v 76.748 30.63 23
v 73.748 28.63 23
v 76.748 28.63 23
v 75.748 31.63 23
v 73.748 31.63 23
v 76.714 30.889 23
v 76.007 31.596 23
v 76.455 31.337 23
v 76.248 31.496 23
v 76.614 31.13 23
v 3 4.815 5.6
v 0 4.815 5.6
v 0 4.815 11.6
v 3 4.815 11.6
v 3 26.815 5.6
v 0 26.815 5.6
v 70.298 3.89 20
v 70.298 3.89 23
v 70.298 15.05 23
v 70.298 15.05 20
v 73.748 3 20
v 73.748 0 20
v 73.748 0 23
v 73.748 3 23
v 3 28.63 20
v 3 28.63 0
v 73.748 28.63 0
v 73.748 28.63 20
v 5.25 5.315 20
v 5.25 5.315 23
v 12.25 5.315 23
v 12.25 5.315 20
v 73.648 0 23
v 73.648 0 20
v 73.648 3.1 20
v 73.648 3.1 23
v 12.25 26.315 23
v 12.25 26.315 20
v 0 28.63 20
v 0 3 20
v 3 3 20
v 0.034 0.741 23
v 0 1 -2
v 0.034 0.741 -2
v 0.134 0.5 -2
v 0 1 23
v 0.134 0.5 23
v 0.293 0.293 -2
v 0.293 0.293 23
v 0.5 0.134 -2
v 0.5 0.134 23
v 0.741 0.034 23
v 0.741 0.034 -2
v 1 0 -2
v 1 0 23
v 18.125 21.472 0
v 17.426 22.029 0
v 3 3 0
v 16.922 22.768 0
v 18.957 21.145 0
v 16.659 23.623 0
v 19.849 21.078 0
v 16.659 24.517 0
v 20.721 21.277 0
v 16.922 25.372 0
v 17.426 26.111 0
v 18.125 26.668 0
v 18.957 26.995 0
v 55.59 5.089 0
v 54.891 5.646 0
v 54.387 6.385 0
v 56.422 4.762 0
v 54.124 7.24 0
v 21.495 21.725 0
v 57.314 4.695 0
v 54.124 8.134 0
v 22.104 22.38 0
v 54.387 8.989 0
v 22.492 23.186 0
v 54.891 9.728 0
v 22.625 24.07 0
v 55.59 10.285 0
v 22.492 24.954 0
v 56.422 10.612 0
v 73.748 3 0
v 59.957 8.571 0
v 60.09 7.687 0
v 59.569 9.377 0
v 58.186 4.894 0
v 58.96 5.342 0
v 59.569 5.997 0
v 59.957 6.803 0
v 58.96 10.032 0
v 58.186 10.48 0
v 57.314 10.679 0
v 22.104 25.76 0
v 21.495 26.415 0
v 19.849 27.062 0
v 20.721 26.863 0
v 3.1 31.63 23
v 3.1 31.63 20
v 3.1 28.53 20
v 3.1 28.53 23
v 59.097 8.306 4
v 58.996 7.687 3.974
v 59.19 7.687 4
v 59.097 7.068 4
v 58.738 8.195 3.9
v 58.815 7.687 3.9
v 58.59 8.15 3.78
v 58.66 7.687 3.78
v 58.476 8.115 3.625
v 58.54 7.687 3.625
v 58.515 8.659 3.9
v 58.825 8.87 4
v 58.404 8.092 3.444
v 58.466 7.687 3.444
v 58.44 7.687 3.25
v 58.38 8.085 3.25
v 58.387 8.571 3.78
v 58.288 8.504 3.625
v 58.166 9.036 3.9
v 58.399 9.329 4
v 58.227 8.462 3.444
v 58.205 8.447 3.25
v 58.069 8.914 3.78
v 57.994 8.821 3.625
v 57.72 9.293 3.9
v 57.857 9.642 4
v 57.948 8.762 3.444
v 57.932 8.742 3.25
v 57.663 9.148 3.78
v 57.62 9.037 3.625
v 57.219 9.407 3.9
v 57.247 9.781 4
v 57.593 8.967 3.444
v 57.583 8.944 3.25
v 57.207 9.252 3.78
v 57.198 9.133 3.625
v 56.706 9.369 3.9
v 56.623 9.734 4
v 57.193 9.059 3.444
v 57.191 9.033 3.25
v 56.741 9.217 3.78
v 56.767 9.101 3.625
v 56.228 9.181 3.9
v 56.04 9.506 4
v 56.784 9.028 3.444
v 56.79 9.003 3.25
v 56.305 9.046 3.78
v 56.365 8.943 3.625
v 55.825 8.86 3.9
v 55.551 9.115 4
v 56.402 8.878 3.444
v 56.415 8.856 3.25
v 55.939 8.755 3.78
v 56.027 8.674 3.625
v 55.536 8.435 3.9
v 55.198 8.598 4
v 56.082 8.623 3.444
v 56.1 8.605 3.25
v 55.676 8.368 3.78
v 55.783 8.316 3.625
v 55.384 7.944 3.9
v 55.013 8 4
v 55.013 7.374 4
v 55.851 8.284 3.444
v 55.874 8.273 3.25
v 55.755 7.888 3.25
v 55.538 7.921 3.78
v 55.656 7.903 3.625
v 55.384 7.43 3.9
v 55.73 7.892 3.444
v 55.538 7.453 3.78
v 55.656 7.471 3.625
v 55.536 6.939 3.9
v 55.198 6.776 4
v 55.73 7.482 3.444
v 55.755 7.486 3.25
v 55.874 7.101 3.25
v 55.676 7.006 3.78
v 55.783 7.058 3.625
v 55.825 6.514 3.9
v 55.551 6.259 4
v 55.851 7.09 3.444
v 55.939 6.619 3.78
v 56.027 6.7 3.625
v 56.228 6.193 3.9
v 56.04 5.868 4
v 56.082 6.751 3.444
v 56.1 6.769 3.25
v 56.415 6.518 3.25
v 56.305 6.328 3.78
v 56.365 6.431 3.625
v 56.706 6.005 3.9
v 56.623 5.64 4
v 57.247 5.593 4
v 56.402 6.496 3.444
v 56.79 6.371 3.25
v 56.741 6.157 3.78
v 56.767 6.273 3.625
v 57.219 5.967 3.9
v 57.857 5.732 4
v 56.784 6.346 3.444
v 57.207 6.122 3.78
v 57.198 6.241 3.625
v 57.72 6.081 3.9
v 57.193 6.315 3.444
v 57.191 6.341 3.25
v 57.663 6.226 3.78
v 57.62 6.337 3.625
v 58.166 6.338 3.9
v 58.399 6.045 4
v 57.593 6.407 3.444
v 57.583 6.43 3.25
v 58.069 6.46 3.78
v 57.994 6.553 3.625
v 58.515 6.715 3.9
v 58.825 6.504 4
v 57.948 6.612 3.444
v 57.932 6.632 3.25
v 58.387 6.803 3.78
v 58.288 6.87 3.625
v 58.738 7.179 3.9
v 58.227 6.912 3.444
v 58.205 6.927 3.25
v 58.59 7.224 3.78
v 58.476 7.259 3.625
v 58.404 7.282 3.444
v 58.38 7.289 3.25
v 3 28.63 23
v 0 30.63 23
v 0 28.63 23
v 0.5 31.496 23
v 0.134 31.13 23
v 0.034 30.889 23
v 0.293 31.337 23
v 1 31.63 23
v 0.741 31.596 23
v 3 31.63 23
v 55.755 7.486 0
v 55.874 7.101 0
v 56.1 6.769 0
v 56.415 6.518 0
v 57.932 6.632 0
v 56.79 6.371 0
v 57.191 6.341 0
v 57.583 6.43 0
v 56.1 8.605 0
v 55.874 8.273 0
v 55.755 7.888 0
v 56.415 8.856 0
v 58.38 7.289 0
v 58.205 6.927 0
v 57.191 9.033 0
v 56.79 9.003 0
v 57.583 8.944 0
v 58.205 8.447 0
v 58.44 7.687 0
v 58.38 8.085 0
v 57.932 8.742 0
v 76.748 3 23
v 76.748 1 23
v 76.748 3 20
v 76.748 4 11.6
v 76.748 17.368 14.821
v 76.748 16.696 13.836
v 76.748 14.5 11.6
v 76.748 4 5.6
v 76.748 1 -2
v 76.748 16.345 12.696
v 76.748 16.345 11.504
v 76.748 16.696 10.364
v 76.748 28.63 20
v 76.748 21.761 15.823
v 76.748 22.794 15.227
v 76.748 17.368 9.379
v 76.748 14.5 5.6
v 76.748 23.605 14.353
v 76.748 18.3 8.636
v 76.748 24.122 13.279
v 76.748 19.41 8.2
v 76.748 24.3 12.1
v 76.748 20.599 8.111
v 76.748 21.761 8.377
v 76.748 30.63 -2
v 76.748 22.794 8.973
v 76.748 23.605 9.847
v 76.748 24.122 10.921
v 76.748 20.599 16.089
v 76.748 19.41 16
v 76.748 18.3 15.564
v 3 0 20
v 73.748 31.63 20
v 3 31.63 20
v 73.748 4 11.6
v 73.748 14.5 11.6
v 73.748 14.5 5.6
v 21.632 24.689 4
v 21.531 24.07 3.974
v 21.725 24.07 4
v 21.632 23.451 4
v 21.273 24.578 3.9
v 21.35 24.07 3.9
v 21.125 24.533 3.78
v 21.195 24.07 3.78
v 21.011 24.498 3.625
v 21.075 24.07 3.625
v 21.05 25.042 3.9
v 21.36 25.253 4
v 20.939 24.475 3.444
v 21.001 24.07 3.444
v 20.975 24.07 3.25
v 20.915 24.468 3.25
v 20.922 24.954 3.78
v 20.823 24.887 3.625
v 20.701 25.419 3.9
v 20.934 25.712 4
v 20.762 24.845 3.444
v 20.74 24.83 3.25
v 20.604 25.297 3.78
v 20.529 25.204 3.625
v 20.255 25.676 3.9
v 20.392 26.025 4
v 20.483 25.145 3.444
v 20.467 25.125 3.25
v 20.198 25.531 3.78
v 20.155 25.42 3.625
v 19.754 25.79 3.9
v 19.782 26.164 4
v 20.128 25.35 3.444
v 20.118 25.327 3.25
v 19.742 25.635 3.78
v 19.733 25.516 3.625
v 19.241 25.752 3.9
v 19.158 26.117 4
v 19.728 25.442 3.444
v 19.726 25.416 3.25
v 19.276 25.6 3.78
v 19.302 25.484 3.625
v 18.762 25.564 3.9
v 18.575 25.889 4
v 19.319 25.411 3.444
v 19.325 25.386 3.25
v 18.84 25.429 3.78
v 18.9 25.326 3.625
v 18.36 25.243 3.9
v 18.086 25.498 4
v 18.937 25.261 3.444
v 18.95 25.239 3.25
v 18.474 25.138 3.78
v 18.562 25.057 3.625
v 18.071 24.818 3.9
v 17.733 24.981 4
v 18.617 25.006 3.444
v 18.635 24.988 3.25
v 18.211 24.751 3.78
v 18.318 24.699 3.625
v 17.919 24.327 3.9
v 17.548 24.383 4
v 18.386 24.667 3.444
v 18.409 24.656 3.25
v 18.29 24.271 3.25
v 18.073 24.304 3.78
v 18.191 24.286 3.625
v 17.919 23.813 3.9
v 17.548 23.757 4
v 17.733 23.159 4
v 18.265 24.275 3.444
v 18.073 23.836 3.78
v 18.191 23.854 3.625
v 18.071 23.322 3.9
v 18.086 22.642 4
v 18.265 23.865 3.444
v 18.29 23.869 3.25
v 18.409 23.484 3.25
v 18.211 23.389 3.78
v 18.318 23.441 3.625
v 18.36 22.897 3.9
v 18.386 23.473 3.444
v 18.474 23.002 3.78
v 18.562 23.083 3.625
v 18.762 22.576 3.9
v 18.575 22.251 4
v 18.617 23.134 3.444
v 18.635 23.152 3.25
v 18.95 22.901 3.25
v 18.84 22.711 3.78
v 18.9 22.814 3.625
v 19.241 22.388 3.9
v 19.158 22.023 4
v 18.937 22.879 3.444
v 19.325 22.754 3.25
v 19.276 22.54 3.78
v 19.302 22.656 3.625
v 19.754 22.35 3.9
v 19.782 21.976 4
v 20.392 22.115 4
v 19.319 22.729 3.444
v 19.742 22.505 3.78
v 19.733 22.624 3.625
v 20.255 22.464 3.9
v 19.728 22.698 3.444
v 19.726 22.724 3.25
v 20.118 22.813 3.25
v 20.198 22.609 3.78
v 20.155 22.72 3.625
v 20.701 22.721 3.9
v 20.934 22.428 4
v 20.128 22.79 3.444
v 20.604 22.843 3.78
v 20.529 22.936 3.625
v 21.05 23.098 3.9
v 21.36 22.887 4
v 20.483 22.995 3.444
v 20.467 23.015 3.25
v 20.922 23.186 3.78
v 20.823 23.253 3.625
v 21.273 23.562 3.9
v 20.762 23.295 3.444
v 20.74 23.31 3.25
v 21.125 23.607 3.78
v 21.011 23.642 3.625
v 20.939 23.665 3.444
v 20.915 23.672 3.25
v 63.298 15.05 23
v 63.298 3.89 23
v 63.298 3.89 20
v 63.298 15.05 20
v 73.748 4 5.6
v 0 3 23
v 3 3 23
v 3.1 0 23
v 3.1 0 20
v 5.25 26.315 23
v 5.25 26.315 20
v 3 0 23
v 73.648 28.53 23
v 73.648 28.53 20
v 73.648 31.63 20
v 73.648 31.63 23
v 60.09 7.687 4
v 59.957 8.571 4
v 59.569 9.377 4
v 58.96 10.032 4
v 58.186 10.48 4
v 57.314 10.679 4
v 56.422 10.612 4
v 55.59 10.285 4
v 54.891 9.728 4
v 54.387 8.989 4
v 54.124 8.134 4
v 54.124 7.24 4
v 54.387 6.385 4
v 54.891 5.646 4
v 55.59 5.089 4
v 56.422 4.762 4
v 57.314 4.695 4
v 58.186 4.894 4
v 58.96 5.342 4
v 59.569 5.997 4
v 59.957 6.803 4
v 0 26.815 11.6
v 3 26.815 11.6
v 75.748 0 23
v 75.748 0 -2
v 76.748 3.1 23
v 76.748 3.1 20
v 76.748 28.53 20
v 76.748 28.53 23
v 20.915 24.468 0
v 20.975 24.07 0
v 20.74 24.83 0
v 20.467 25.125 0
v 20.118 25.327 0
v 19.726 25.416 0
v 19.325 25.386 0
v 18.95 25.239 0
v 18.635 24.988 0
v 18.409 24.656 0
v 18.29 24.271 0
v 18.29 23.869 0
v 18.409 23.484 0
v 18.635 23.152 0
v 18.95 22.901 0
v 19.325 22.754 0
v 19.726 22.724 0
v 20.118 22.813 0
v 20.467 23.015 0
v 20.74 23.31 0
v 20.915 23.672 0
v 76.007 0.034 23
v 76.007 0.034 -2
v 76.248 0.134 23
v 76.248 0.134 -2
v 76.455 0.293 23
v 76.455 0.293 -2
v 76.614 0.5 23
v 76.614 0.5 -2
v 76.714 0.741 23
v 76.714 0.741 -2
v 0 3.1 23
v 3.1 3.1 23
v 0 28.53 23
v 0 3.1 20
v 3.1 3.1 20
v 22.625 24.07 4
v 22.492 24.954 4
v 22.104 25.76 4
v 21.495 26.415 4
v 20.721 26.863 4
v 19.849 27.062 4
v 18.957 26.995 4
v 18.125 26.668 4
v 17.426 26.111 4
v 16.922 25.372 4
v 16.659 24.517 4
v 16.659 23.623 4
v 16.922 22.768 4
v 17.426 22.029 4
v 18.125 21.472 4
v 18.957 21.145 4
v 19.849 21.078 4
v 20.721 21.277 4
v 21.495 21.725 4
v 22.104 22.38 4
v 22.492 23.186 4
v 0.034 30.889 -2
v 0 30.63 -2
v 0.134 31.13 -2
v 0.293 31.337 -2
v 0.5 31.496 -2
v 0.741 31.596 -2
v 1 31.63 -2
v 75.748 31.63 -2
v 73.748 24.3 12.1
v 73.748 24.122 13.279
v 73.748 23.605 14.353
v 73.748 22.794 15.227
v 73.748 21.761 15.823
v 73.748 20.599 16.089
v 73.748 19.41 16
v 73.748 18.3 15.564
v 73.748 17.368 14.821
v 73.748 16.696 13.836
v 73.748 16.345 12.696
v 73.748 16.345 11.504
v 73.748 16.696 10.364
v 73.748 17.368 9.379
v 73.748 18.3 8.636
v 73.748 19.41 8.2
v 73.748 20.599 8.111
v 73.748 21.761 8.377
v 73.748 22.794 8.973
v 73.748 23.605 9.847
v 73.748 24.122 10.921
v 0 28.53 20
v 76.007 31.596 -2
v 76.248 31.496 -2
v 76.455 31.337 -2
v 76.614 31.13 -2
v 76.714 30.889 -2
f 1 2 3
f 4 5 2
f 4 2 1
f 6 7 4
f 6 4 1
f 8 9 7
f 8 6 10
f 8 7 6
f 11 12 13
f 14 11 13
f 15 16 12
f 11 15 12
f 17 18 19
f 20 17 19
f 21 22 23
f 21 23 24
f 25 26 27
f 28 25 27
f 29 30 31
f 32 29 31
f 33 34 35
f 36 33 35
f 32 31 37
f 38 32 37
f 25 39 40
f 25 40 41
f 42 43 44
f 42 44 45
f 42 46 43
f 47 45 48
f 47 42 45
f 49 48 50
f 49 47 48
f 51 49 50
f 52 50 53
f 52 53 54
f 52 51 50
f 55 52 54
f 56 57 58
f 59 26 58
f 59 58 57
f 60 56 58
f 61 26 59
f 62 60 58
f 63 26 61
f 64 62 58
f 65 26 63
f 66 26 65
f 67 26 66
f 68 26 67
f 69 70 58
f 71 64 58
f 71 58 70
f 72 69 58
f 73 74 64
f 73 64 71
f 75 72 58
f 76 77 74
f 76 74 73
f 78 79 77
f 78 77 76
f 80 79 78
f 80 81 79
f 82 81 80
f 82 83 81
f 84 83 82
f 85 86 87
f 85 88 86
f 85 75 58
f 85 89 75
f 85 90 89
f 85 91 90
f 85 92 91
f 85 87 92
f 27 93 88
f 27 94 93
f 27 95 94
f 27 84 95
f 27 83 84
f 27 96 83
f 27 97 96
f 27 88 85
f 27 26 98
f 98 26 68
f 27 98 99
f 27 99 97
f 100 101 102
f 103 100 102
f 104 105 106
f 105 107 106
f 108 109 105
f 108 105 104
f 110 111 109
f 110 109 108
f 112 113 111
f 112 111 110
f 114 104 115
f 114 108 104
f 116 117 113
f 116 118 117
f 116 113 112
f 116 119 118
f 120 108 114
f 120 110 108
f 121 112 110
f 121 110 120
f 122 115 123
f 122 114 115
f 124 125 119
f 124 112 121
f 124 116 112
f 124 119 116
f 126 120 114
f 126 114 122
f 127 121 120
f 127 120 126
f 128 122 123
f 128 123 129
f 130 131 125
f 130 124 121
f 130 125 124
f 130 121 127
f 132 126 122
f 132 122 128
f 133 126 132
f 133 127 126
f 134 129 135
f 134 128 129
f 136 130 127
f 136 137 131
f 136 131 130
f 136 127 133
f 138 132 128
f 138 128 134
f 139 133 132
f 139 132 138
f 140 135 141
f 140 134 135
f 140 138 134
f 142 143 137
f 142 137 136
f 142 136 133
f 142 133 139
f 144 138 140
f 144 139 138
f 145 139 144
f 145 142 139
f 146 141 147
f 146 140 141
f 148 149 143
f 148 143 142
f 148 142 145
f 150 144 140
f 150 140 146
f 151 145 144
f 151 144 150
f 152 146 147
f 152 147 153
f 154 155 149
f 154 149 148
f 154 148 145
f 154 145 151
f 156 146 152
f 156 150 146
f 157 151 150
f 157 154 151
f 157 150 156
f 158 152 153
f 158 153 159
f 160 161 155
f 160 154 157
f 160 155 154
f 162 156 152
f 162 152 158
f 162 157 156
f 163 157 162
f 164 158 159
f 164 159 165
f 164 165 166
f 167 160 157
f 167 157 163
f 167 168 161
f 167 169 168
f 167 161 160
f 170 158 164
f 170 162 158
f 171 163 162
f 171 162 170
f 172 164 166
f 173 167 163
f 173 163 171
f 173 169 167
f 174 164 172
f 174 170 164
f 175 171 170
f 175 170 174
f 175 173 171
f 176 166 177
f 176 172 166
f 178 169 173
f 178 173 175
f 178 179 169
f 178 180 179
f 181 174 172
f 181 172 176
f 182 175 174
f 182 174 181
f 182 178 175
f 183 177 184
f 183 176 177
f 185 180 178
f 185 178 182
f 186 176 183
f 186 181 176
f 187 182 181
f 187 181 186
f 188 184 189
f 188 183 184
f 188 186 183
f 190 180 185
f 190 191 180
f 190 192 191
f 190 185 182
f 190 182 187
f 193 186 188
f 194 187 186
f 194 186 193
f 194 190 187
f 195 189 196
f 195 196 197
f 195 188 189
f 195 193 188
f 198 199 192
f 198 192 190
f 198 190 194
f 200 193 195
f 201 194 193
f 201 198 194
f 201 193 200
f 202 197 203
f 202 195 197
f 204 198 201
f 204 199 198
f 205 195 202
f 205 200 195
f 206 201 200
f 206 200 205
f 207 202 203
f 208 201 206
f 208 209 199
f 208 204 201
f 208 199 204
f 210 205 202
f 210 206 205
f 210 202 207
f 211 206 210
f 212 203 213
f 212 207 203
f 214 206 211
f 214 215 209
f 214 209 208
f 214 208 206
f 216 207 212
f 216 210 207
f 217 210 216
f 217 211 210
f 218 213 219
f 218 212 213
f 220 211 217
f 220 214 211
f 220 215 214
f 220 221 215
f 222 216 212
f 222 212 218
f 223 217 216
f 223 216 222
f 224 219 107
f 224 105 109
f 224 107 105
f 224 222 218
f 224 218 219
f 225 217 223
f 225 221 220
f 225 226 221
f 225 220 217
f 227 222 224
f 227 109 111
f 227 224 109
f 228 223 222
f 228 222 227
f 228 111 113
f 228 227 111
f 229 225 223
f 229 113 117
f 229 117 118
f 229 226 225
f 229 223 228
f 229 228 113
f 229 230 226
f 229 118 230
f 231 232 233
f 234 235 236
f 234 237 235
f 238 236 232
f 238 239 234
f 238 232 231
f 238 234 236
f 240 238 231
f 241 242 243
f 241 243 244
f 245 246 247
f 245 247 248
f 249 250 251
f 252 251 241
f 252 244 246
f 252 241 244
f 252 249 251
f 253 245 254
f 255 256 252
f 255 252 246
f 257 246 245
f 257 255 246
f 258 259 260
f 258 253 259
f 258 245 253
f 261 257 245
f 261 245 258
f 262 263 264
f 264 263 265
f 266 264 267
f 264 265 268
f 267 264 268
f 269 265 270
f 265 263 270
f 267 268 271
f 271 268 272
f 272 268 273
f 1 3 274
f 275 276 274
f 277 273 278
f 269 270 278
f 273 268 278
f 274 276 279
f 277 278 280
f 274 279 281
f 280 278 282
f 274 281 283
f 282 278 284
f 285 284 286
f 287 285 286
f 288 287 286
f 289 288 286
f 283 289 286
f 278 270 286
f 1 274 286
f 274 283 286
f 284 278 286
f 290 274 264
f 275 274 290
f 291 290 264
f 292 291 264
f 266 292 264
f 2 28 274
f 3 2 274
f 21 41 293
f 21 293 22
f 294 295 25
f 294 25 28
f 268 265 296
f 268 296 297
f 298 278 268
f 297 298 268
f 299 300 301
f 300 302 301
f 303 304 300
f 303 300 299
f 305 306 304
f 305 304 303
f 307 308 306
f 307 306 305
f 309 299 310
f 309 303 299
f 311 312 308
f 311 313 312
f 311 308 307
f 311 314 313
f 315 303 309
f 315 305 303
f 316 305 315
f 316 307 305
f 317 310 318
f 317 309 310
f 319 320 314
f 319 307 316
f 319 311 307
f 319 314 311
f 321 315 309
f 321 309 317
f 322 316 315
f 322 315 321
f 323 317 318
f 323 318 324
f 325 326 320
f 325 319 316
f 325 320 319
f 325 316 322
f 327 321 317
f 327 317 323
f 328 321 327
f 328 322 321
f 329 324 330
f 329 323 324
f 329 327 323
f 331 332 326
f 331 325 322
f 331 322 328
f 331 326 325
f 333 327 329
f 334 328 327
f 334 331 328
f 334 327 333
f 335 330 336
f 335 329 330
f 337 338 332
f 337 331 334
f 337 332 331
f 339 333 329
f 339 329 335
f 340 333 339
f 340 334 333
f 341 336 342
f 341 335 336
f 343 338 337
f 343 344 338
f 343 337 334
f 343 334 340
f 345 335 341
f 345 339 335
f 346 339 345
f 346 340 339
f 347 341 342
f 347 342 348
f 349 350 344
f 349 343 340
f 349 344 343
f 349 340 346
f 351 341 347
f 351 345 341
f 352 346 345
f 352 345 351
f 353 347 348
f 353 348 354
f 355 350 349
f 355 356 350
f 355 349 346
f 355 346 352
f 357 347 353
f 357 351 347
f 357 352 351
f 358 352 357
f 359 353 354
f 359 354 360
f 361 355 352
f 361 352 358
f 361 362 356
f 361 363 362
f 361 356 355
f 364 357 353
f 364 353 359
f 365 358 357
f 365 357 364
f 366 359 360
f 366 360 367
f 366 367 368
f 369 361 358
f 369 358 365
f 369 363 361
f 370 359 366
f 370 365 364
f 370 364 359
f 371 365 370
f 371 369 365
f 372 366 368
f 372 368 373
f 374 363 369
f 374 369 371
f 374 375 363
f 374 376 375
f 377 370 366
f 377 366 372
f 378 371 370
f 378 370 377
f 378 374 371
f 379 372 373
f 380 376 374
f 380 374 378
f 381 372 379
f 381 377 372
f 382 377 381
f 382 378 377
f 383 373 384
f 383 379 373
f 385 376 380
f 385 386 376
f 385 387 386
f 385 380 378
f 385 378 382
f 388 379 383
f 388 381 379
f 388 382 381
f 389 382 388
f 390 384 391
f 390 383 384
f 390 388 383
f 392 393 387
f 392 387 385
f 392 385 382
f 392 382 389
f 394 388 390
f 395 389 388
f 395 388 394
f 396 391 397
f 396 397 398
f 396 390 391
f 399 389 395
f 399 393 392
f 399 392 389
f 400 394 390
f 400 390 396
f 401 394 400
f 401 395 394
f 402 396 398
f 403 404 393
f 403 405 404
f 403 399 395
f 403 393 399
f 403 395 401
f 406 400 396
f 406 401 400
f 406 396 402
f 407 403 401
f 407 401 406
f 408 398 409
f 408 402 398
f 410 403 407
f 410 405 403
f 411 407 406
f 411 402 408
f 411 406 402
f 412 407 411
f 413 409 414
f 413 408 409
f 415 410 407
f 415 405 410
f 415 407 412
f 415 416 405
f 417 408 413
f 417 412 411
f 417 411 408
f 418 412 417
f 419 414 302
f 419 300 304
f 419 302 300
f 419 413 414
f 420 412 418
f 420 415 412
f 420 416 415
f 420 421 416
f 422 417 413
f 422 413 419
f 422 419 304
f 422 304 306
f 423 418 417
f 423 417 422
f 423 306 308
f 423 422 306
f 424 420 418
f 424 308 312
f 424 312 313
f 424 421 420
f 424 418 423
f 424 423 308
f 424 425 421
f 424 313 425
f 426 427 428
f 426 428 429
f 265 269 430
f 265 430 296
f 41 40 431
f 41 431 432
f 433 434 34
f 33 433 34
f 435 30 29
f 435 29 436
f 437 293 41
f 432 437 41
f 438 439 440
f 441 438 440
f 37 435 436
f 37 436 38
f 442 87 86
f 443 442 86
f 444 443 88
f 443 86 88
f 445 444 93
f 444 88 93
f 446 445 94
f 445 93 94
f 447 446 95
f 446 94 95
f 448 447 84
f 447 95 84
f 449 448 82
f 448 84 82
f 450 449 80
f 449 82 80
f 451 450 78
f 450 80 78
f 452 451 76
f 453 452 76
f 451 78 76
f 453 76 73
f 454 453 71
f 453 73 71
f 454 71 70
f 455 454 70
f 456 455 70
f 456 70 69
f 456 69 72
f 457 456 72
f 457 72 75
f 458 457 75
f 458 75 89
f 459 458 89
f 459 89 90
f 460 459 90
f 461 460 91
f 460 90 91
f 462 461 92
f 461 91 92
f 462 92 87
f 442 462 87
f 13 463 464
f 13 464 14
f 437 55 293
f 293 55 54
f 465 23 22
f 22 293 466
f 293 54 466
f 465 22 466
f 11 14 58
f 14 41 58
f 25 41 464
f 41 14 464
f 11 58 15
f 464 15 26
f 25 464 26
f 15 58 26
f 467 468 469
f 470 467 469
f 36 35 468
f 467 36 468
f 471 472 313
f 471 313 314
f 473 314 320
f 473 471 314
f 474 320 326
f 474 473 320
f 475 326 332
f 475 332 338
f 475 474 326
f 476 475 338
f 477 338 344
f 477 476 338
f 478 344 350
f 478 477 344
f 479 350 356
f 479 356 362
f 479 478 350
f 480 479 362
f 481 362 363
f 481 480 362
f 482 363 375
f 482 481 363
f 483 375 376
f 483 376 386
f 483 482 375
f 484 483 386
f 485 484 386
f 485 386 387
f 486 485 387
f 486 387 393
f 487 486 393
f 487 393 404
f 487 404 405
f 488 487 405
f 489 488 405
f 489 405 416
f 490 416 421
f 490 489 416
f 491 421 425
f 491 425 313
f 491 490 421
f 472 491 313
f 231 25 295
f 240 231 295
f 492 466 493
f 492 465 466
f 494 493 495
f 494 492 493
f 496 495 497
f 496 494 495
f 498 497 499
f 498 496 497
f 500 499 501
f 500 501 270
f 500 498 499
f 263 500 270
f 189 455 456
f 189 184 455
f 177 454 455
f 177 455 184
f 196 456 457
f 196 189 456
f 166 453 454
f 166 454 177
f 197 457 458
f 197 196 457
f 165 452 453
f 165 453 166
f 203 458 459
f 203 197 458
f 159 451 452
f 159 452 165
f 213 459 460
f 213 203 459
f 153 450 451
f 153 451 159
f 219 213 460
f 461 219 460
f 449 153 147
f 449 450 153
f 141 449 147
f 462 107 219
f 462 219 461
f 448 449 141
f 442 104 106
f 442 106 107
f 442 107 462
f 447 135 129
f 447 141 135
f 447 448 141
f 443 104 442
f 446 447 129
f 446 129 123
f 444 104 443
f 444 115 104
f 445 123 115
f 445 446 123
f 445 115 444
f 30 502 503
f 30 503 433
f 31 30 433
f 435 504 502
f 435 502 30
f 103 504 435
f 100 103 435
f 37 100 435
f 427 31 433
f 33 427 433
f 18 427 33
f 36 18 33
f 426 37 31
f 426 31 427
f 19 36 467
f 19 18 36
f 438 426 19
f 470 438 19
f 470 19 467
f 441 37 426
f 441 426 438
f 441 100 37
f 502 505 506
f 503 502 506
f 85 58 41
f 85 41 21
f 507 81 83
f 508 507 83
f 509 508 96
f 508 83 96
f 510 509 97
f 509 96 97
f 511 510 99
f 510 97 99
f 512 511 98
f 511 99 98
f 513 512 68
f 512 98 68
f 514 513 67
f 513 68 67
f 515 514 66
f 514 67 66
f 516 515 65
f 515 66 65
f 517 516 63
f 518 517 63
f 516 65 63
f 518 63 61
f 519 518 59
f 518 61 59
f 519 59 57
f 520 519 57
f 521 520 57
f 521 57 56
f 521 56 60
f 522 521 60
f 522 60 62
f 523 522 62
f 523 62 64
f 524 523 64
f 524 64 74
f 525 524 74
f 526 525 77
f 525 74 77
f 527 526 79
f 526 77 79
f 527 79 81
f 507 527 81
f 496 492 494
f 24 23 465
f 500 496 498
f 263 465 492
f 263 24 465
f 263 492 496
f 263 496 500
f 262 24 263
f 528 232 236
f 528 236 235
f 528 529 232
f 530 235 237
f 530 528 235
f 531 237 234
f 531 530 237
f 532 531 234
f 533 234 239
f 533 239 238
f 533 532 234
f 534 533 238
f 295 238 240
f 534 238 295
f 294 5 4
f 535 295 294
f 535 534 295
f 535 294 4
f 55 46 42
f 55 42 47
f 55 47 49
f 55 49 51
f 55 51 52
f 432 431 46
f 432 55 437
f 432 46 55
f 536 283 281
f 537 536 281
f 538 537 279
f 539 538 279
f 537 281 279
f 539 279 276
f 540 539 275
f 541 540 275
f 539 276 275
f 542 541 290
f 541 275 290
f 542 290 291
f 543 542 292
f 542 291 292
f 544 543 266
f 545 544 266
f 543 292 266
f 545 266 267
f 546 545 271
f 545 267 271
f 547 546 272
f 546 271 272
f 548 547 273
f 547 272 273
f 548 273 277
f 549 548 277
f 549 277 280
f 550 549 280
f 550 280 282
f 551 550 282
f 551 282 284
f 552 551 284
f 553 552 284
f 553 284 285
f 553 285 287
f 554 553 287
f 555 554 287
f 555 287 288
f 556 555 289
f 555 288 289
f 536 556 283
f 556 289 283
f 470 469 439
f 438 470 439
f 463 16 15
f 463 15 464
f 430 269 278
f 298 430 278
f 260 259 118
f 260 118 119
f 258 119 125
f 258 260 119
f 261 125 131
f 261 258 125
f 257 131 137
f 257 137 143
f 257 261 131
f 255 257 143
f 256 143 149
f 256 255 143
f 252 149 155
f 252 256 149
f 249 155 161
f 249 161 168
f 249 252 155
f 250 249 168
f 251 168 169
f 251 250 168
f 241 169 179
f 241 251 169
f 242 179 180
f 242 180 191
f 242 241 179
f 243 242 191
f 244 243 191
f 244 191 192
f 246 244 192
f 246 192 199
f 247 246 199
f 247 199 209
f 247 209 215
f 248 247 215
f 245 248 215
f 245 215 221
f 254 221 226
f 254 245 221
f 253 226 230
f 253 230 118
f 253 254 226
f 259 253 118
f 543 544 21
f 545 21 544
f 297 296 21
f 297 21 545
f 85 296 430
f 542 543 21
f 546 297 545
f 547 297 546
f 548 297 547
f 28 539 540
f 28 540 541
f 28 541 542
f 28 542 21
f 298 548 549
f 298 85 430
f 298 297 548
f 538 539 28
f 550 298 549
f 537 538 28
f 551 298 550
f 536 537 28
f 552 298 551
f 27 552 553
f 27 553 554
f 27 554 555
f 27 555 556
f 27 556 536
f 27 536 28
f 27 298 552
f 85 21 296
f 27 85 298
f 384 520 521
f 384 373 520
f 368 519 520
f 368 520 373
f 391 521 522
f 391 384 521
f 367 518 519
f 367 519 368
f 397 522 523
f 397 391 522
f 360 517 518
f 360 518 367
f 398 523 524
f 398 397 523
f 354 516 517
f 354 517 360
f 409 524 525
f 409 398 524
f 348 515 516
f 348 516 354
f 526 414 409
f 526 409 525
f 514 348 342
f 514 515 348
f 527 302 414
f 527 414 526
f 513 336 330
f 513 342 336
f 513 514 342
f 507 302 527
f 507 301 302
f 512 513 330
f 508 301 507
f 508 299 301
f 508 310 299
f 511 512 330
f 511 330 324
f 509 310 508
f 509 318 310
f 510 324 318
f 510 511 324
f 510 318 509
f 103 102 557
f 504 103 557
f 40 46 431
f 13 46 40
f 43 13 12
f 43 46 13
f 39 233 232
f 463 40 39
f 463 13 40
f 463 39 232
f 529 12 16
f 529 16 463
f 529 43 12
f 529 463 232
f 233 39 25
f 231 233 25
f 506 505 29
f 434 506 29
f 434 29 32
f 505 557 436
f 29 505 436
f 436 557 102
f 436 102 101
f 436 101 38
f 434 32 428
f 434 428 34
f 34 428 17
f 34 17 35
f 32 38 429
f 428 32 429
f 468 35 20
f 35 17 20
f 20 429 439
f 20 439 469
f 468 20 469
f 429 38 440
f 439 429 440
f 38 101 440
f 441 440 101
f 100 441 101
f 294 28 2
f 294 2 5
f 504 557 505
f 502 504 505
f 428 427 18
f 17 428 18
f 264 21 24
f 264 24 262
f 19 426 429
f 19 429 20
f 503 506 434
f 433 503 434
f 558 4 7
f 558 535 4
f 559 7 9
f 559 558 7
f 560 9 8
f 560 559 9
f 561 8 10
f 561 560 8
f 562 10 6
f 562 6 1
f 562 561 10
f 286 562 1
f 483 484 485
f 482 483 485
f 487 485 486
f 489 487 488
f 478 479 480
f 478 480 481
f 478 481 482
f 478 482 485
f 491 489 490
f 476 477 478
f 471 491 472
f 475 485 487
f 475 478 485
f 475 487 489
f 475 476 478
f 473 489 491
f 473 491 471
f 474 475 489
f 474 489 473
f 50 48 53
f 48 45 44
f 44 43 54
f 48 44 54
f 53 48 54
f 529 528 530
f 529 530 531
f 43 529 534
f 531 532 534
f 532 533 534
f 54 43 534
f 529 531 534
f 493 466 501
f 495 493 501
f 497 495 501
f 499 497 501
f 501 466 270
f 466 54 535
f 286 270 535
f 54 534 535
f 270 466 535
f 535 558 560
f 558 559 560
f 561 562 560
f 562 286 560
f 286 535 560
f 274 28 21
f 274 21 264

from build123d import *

# Parameters (mm, degrees)
SKETCH_W        = 76.748
SKETCH_H        = 31.63
PAD_DEPTH       = 2
SKETCH001_R     = 3
SKETCH001_R_2   = 1.35
PAD001_DEPTH    = 4
SKETCH002_W     = 76.748
SKETCH002_H     = 31.63
SKETCH002_W_2   = 70.748
SKETCH002_H_2   = 25.63
PAD002_DEPTH    = 20
SKETCH003_W     = 3
SKETCH003_H     = 3
PAD003_DEPTH    = 3
SKETCH004_W     = 22
SKETCH004_H     = 6
POCKET_DEPTH    = 3
SKETCH005_R     = 4
SKETCH005_W     = 10.5
SKETCH005_H     = 6
POCKET001_DEPTH = 3
FILLET_R        = 1
FILLET001_R     = 0.75
PAD004_DEPTH    = 3
SKETCH007_W     = 7
SKETCH007_H     = 21
SKETCH007_H_2   = 11.16
POCKET002_DEPTH = 3.001


with BuildPart() as body:
    # Sketch → Pad (new body)
    with BuildSketch(Plane.XY):
        with Locations((38.374, 15.815)):
            Rectangle(SKETCH_W, SKETCH_H)
    extrude(amount=-PAD_DEPTH)

    # Sketch001 (on Face5 of Pad) → Pad001 (join)
    with BuildSketch(Plane.XY):
        with Locations((19.625, 24.07)):
            Circle(SKETCH001_R)
        with Locations((19.625, 24.07)):
            Circle(SKETCH001_R_2, mode=Mode.SUBTRACT)
        with Locations((57.09, 7.687)):
            Circle(SKETCH001_R)
        with Locations((57.09, 7.687)):
            Circle(SKETCH001_R_2, mode=Mode.SUBTRACT)
    extrude(amount=PAD001_DEPTH)

    # Sketch002 (on Face4 of Pad001) → Pad002 (join)
    with BuildSketch(Plane.XY):
        with Locations((38.374, 15.815)):
            Rectangle(SKETCH002_W, SKETCH002_H)
        with Locations((38.374, 15.815)):
            Rectangle(SKETCH002_W_2, SKETCH002_H_2, mode=Mode.SUBTRACT)
    extrude(amount=PAD002_DEPTH)

    # Sketch003 (on Face9 of Pad002) → Pad003 (join)
    with BuildSketch(Plane.XY.offset(20)):
        with Locations((1.5, 30.13)):
            Rectangle(SKETCH003_W, SKETCH003_H)
        with Locations((75.248, 30.13)):
            Rectangle(SKETCH003_W, SKETCH003_H)
        with Locations((75.248, 1.5)):
            Rectangle(SKETCH003_W, SKETCH003_H)
        with Locations((1.5, 1.5)):
            Rectangle(SKETCH003_W, SKETCH003_H)
    extrude(amount=PAD003_DEPTH)

    # Sketch004 (on Face7 of Pad003) → Pocket (cut)
    with BuildSketch(Plane(origin=(0, 0, 0), x_dir=(0, -1, 0), z_dir=(-1, 0, 0))):
        with Locations((-15.815, 8.6)):
            Rectangle(SKETCH004_W, SKETCH004_H)
    extrude(amount=-POCKET_DEPTH, mode=Mode.SUBTRACT)

    # Sketch005 (on Face8 of Pocket) → Pocket001 (cut)
    with BuildSketch(Plane.YZ.offset(76.748)):
        with Locations((20.3, 12.1)):
            Circle(SKETCH005_R)
        with Locations((9.25, 8.6)):
            Rectangle(SKETCH005_W, SKETCH005_H)
    extrude(amount=-POCKET001_DEPTH, mode=Mode.SUBTRACT)

    # Fillet
    fillet_edges = [body.edges().sort_by_distance(p)[0] for p in [
        (76.748, 31.63, 10),
        (76.748, 0, 10),
        (0, 0, 10),
        (0, 31.63, 10),
    ]]
    fillet(fillet_edges, radius=FILLET_R)

    # Fillet001
    fillet001_edges = [body.edges().sort_by_distance(p)[0] for p in [
        (55.74, 7.687, 4),
        (18.275, 24.07, 4),
    ]]
    fillet(fillet001_edges, radius=FILLET001_R)


with BuildPart() as topcover:
    # Sketch006 → Pad004 (new body)
    with BuildSketch(Plane.XY):
        Polygon((3.1, 31.63), (3.1, 28.53), (0, 28.53), (0, 3.1), (3.1, 3.1), (3.1, 0), (73.648, 0), (73.648, 3.1), (76.748, 3.1), (76.748, 28.53), (73.648, 28.53), (73.648, 31.63), align=None)
    extrude(amount=PAD004_DEPTH)

    # Sketch007 (on Face14 of Pad004) → Pocket002 (cut, through all)
    with BuildSketch(Plane.XY.offset(3)):
        with Locations((8.75, 15.815)):
            Rectangle(SKETCH007_W, SKETCH007_H)
        with Locations((66.798, 9.47)):
            Rectangle(SKETCH007_W, SKETCH007_H_2)
    extrude(amount=-POCKET002_DEPTH, mode=Mode.SUBTRACT)


with BuildPart() as topcover_1:
    # Body001 placement: moved
    add(topcover.part.moved(Location((0, 0, 20))))


solid = Compound([body.part, topcover_1.part])
